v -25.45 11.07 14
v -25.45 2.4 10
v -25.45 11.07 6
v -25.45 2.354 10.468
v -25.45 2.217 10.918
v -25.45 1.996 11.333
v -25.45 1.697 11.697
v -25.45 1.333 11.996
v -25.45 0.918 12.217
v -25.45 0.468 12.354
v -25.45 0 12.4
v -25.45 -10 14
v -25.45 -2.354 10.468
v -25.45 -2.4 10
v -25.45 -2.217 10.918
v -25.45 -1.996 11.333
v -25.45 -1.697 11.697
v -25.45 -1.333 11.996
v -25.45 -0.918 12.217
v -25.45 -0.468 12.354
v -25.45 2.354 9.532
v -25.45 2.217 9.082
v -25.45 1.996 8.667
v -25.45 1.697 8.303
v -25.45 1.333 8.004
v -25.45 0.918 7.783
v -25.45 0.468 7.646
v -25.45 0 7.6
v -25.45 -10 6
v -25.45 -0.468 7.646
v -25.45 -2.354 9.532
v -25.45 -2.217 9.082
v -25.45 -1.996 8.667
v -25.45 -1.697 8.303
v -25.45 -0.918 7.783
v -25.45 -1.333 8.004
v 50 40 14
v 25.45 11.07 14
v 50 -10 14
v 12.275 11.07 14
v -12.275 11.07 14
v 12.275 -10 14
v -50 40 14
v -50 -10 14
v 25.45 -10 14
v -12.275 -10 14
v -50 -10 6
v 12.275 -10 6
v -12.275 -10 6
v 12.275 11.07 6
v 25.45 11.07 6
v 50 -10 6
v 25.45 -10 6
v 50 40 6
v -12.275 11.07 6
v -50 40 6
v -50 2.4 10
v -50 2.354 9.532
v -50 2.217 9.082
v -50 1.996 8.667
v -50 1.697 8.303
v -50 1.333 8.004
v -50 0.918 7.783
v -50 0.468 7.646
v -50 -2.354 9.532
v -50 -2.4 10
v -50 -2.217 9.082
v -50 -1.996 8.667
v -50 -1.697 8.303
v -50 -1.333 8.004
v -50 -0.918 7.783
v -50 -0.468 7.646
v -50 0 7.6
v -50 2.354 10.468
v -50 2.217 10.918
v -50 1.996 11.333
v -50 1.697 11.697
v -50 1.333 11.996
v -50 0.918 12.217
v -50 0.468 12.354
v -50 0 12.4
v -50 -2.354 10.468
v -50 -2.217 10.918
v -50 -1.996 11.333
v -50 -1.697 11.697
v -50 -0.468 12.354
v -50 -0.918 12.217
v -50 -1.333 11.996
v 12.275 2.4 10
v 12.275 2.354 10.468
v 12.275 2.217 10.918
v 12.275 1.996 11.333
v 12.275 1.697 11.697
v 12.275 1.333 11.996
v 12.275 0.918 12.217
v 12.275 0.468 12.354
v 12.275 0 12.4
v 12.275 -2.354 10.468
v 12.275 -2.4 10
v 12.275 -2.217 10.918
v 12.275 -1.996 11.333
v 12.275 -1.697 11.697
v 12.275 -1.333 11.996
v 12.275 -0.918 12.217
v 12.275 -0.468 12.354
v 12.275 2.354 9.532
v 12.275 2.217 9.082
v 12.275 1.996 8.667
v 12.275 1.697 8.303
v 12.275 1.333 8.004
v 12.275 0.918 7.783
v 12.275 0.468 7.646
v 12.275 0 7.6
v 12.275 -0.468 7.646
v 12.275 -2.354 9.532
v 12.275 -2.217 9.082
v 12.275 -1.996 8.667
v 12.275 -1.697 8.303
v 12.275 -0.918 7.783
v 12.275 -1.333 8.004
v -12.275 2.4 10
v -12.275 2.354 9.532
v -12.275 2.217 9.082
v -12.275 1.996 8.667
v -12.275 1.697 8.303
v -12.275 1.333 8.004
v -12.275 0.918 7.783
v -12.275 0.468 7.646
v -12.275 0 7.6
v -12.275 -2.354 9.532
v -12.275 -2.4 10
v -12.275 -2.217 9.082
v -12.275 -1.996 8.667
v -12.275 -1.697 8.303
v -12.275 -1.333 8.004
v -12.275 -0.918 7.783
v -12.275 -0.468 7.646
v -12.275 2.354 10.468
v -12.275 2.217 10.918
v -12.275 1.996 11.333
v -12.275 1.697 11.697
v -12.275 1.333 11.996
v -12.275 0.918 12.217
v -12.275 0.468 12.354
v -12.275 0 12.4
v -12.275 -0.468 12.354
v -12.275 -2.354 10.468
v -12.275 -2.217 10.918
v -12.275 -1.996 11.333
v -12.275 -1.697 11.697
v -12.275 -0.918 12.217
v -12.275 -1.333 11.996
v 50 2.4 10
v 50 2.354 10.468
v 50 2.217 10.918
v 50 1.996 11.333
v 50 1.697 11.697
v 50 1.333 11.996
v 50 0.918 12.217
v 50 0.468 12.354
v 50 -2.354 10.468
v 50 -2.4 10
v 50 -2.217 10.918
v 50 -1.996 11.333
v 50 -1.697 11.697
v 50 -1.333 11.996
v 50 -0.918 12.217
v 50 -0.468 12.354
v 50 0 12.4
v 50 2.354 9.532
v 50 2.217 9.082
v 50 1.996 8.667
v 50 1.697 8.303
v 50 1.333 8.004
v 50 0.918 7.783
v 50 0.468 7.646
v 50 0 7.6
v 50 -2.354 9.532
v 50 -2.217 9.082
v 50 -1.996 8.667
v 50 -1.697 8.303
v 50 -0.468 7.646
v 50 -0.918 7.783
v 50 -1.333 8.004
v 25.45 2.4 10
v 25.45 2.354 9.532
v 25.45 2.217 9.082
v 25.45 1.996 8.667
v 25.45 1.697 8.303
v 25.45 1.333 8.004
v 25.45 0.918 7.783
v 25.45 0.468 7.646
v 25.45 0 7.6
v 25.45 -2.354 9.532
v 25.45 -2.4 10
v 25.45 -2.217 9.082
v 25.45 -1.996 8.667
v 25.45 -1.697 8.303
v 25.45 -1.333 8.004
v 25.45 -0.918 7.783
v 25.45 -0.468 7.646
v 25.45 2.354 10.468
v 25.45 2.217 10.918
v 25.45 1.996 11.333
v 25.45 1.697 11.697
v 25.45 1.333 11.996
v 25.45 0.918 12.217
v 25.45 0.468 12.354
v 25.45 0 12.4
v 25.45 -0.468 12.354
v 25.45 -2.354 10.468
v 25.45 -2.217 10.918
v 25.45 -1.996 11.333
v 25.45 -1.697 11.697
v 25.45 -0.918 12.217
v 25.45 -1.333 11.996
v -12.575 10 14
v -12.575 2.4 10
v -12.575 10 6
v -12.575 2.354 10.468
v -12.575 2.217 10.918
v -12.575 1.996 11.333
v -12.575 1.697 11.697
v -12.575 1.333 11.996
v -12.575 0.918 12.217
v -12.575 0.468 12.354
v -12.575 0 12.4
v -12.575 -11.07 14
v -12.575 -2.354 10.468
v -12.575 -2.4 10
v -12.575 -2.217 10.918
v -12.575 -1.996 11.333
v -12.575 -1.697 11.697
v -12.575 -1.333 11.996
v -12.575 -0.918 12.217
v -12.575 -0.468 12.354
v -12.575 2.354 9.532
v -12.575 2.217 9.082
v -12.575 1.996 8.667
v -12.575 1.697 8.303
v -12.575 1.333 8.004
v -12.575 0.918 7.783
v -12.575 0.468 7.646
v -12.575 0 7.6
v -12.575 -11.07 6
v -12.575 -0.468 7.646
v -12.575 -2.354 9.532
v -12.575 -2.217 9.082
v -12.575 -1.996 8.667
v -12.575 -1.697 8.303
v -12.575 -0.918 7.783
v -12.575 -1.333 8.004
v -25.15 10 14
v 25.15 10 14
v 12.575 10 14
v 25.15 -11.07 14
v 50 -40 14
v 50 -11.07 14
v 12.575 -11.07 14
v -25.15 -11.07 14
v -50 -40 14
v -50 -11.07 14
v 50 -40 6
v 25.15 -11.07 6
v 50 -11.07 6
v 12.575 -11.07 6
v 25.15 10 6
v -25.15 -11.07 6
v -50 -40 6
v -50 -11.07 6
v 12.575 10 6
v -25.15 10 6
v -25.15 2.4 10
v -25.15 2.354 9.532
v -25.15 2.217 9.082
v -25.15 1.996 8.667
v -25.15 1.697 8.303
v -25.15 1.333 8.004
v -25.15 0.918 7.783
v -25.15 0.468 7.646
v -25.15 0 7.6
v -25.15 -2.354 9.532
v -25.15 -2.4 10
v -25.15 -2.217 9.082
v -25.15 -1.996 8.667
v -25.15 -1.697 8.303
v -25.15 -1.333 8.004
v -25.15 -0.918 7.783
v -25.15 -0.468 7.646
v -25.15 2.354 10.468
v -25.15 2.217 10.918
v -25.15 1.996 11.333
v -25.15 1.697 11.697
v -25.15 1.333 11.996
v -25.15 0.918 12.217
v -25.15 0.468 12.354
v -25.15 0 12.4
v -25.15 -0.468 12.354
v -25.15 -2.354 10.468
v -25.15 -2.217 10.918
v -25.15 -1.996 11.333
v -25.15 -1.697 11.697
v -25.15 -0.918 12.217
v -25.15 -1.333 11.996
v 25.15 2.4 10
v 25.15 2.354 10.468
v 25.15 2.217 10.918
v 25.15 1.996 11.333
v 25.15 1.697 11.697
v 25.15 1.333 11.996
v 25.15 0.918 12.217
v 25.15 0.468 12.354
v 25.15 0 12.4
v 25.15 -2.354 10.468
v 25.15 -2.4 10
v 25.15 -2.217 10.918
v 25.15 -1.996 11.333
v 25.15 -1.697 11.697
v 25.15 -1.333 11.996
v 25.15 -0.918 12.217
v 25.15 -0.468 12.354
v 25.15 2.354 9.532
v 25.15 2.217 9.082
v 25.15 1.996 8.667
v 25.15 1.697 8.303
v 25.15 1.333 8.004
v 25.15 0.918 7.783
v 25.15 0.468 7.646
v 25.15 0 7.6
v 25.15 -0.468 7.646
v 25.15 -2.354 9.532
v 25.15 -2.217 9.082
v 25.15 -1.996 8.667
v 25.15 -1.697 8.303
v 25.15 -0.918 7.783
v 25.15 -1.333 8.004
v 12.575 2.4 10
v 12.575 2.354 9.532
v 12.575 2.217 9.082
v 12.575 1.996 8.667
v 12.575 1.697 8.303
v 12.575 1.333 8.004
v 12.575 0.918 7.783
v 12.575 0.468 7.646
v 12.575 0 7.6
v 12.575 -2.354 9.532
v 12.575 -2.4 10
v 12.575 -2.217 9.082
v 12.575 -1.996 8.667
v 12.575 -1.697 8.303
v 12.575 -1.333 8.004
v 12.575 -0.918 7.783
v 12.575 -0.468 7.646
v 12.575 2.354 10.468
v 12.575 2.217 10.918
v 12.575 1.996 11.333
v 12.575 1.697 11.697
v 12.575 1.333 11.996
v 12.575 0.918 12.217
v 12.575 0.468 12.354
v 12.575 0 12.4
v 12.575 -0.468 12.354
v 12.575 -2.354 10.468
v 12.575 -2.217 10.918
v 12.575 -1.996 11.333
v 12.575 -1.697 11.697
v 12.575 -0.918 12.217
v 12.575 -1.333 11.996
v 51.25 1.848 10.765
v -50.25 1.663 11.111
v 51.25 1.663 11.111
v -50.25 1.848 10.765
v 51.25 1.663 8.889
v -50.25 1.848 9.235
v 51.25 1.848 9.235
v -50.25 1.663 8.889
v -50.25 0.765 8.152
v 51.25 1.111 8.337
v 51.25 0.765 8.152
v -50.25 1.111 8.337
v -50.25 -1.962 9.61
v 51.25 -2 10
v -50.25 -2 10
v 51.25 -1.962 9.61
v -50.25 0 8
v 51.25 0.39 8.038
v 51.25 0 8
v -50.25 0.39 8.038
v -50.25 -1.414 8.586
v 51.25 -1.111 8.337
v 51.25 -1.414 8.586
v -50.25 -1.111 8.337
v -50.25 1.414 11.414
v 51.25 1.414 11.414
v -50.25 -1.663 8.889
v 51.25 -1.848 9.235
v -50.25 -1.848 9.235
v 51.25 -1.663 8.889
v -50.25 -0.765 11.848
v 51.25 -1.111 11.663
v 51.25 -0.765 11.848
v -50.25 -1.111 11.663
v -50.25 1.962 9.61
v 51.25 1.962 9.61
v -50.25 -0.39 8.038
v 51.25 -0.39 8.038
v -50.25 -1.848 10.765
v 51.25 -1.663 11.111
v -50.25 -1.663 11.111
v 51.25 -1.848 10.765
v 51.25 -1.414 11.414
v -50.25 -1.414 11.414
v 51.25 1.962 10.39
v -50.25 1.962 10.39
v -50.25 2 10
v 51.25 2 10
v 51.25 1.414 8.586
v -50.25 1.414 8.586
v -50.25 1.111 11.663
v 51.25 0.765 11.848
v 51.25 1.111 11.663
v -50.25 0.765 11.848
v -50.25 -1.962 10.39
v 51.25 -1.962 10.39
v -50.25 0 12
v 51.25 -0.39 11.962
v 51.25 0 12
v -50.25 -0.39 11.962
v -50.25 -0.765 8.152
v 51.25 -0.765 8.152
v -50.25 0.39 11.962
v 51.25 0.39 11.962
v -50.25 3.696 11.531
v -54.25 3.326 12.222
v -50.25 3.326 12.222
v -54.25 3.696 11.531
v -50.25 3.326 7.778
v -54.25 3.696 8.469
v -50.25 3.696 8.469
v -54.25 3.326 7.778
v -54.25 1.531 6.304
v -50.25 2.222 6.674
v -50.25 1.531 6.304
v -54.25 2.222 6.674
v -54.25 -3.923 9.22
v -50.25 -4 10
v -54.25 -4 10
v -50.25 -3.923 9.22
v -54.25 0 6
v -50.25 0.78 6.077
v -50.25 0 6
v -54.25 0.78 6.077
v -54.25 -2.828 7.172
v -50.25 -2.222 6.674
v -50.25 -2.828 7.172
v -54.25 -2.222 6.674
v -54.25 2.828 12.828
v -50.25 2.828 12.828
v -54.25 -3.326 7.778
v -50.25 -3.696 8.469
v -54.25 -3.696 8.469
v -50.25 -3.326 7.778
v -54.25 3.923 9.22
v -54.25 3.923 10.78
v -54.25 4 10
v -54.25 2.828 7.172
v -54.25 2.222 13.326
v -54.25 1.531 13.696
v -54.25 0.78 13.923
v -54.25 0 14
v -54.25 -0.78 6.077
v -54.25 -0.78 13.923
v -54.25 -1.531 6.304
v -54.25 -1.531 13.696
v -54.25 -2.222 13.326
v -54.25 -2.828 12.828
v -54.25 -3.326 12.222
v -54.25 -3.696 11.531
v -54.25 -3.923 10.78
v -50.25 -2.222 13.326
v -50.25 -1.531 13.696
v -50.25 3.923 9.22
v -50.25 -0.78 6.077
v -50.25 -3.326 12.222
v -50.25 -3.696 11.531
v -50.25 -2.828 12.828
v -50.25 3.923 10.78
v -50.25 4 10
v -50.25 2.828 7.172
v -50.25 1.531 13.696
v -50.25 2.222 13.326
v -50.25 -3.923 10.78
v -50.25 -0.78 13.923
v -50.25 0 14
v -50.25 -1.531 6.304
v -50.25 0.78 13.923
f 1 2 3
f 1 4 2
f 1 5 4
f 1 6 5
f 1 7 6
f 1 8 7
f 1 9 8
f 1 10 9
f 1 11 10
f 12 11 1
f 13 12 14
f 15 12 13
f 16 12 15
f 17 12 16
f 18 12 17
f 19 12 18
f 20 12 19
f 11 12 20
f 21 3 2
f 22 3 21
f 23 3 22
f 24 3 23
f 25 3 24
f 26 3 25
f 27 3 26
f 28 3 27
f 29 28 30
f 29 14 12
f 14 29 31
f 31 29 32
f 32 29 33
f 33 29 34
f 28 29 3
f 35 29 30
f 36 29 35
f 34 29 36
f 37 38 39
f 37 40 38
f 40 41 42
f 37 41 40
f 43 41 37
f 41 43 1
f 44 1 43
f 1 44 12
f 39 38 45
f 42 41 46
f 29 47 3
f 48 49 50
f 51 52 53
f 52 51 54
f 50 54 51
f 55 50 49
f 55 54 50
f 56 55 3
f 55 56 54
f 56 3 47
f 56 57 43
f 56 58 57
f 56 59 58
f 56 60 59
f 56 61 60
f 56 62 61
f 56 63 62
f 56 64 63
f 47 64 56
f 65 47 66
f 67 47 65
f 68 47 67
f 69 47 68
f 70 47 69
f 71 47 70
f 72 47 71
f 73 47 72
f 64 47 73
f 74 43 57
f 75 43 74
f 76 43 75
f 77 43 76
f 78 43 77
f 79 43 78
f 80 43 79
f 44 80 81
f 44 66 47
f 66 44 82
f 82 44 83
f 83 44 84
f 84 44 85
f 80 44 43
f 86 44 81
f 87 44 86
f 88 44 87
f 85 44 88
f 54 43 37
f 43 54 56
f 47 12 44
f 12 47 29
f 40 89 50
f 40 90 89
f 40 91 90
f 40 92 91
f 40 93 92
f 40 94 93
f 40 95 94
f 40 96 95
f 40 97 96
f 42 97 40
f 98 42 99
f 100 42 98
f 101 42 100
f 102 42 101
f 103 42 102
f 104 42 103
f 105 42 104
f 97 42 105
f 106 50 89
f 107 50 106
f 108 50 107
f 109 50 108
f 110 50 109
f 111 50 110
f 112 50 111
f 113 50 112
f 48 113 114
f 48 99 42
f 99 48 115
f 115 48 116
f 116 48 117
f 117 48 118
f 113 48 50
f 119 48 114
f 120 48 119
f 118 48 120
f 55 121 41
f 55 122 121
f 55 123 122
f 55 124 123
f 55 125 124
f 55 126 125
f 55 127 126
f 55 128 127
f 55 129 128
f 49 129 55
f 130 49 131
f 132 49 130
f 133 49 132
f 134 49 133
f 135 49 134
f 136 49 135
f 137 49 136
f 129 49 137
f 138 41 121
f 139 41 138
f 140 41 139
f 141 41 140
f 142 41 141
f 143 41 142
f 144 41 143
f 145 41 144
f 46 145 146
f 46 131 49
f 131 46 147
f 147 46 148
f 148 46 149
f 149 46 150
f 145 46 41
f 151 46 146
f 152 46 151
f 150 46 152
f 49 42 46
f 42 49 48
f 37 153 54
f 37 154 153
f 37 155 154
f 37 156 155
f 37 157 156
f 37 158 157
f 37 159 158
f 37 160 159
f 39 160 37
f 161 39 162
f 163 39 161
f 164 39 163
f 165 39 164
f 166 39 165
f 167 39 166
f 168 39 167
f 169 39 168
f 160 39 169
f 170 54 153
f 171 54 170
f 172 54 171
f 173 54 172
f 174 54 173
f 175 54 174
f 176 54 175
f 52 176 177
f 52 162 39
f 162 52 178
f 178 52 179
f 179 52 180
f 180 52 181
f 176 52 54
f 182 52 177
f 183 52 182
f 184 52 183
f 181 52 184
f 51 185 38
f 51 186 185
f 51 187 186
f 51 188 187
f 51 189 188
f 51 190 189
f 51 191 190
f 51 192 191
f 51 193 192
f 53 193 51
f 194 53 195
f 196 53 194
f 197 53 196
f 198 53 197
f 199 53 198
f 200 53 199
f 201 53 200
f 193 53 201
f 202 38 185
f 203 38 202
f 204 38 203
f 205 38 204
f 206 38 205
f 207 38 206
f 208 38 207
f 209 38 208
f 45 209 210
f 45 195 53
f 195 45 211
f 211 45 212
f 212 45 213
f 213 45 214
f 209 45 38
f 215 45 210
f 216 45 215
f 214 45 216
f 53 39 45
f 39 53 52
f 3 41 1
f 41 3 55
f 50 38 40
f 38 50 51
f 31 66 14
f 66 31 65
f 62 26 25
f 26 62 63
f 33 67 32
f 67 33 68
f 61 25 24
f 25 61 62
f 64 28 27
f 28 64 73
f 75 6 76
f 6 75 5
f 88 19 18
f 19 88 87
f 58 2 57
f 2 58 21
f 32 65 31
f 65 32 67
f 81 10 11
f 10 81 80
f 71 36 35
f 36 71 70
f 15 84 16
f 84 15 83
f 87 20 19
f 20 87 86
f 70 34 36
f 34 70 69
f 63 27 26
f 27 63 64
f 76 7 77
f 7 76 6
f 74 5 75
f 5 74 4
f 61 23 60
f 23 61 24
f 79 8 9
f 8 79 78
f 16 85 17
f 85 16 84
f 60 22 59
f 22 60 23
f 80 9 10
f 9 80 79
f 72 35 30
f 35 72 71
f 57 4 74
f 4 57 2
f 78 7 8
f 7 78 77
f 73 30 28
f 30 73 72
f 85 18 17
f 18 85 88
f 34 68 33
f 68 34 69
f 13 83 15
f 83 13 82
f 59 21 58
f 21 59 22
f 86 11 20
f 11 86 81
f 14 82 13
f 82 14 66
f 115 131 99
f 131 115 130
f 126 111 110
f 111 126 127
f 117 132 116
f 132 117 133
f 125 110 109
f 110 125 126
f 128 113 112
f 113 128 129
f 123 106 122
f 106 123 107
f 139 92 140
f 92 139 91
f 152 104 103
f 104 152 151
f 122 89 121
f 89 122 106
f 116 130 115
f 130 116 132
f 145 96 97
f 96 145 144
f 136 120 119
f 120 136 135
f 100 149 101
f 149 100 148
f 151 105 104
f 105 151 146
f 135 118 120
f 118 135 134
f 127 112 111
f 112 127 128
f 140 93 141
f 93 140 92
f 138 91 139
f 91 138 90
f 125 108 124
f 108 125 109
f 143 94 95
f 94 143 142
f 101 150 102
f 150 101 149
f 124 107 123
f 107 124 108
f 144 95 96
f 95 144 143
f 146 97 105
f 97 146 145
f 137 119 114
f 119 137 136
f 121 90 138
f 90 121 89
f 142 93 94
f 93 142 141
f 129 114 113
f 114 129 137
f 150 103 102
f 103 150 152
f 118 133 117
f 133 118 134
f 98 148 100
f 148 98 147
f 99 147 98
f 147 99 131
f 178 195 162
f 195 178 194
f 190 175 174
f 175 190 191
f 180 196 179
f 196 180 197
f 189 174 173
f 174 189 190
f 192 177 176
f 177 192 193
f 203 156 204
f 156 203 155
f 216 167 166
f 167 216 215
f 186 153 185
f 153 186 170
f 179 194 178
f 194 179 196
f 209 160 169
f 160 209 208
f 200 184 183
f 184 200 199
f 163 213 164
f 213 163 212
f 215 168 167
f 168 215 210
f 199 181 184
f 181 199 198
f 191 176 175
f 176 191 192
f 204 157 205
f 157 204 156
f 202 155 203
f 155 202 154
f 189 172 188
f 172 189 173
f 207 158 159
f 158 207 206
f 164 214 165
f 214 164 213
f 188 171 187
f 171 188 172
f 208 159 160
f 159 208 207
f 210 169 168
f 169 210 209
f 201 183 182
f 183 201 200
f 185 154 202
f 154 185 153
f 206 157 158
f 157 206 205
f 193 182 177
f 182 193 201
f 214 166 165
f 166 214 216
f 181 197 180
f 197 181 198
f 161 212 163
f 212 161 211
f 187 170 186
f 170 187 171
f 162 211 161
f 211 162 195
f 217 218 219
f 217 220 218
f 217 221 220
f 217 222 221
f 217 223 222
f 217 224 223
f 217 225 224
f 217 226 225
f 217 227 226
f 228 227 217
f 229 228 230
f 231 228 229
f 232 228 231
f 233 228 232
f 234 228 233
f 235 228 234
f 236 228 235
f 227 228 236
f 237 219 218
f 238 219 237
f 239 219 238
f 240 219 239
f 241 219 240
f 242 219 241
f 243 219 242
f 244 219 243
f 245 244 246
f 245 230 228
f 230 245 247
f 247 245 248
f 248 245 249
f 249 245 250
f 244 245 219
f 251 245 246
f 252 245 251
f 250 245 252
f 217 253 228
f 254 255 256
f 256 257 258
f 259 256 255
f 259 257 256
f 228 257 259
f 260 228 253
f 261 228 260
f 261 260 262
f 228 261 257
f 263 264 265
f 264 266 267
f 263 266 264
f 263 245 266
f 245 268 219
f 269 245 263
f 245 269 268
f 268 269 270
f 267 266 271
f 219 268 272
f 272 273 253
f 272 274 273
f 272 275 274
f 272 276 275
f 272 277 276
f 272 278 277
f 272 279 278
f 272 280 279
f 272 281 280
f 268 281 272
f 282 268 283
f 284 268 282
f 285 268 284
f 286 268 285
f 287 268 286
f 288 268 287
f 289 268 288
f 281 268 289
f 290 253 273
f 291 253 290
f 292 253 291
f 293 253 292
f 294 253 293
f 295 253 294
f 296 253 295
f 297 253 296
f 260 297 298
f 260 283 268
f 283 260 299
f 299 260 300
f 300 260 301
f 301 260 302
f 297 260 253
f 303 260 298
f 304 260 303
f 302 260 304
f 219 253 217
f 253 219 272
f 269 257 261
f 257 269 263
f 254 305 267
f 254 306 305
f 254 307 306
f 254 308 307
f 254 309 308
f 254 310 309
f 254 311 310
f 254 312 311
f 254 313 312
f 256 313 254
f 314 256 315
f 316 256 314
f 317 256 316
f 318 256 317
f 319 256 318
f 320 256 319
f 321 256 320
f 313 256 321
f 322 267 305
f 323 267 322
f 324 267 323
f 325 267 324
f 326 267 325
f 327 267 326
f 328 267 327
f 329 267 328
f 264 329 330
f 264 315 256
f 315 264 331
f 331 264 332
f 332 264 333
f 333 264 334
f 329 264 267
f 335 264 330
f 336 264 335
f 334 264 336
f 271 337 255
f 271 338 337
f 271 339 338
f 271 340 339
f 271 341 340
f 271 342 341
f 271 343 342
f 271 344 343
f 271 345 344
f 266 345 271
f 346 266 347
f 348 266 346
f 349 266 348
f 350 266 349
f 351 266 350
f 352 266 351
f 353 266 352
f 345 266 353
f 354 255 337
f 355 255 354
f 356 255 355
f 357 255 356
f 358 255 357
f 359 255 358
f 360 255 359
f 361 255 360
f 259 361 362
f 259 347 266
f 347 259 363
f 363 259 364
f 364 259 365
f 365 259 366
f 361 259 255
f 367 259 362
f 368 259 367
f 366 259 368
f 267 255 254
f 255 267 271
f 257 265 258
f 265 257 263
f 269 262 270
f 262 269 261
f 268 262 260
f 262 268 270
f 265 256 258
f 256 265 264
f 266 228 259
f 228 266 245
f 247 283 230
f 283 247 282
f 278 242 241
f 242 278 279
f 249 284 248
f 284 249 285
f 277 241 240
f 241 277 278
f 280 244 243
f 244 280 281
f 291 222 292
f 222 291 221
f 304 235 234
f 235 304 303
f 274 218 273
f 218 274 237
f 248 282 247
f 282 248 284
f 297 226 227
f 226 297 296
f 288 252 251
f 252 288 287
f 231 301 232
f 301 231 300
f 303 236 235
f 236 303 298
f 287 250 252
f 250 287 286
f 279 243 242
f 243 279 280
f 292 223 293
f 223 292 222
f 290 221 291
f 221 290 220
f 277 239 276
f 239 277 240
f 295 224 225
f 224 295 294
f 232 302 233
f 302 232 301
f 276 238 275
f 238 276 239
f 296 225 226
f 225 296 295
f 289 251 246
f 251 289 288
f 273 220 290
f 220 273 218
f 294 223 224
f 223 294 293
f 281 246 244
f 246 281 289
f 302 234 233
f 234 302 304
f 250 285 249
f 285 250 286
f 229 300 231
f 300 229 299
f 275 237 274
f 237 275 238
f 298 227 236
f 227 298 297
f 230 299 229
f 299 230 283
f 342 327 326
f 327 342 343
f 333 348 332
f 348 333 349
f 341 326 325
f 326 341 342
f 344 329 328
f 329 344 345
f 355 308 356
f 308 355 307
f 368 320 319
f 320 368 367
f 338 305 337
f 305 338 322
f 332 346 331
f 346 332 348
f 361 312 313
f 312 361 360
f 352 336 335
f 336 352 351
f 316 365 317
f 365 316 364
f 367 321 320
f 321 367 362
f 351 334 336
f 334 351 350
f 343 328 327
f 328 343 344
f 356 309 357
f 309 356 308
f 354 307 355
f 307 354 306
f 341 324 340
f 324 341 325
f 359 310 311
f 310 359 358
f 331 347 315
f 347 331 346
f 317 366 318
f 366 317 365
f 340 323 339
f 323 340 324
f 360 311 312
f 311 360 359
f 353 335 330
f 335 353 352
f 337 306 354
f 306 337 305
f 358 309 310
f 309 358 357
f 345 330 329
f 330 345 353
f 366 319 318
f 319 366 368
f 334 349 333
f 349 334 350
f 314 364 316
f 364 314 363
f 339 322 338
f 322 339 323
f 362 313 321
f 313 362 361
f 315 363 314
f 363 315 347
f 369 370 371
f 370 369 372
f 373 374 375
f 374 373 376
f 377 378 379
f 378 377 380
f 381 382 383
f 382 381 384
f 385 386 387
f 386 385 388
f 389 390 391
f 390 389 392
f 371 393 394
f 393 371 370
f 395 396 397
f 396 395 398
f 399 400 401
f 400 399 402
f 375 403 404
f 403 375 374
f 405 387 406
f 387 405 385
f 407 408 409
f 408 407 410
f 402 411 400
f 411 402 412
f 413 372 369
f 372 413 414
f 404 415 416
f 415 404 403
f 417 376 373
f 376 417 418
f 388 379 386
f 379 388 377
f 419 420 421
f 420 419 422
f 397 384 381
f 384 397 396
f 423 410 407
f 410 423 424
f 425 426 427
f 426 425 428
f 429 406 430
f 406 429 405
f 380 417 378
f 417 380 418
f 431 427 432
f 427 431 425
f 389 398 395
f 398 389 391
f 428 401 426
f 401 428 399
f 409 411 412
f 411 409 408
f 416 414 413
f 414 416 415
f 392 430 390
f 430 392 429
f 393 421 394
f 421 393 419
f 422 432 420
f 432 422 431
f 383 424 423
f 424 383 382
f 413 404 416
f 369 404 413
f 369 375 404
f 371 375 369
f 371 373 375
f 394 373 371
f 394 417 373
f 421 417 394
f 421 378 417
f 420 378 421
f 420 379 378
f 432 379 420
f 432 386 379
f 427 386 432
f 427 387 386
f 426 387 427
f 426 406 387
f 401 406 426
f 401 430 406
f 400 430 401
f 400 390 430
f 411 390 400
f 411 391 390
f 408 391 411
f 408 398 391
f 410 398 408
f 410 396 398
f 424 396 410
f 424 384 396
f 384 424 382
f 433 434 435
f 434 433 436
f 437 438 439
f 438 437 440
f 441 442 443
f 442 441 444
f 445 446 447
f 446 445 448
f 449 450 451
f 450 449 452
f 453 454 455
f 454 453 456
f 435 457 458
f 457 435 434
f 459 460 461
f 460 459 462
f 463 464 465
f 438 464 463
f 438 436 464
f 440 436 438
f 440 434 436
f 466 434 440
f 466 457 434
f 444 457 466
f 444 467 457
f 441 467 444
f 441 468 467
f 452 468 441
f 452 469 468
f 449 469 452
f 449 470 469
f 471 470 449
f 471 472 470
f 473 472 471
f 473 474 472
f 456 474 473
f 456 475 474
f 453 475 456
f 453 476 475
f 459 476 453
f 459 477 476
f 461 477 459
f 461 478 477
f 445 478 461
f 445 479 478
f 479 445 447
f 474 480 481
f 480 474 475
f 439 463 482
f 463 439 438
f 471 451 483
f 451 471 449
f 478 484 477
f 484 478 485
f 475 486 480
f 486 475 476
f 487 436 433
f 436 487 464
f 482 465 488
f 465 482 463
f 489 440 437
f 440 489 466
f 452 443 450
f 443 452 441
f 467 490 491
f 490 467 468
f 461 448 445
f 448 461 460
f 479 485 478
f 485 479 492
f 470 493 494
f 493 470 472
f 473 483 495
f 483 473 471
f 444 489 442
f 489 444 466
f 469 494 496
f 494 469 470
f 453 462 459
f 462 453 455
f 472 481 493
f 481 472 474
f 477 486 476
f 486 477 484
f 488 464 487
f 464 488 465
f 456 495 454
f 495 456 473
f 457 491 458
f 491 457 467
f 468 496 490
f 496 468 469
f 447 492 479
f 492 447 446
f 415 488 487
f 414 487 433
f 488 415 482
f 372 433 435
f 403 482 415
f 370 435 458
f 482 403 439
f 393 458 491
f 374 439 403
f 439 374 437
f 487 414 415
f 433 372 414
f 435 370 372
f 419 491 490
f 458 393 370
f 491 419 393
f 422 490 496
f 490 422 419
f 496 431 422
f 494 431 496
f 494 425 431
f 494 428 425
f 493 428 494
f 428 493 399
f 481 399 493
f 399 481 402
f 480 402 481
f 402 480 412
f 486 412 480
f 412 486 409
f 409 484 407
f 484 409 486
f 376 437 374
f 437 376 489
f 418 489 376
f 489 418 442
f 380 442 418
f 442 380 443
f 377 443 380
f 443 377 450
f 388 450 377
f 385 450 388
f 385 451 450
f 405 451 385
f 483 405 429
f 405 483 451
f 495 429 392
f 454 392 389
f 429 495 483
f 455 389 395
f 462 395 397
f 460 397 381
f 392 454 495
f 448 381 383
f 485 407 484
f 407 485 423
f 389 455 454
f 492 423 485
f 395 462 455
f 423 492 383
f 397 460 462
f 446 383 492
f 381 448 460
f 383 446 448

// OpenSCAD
$fn = 32;

// ------------------------------------------------------------------------
// Butt hinge: hinge 100 mm, leaf swung 0 deg
// Every part is its own module, assembly() places every instance.
// ------------------------------------------------------------------------

// --- part 1 ---
module hinge_base() {
  difference() {
    union() {
      translate([-50, -10, -4]) cube([24.55, 50, 8]);
      translate([-12.275, -10, -4]) cube([24.55, 50, 8]);
      translate([25.45, -10, -4]) cube([24.55, 50, 8]);
      translate([-50, 11.07, -4]) cube([100, 28.93, 8]);
    }
    translate([-37.725, 0, 0]) rotate([0, 90, 0]) cylinder(h = 26.55, d = 4.8, center = true);
    translate([0, 0, 0]) rotate([0, 90, 0]) cylinder(h = 26.55, d = 4.8, center = true);
    translate([37.725, 0, 0]) rotate([0, 90, 0]) cylinder(h = 26.55, d = 4.8, center = true);
  }
}

// --- part 2 ---
module hinge_mover() {
  difference() {
    union() {
      translate([-25.15, -40, -4]) cube([12.575, 50, 8]);
      translate([12.575, -40, -4]) cube([12.575, 50, 8]);
      translate([-50, -40, -4]) cube([100, 28.93, 8]);
    }
    translate([-18.863, 0, 0]) rotate([0, 90, 0]) cylinder(h = 14.575, d = 4.8, center = true);
    translate([18.863, 0, 0]) rotate([0, 90, 0]) cylinder(h = 14.575, d = 4.8, center = true);
  }
}

// --- part 3 ---
module hinge_pin() {
  rotate([0, 90, 0]) cylinder(h = 102.5, d = 4, center = true);
  translate([-54.25, 0, 0]) rotate([0, 90, 0]) cylinder(h = 4, d = 8);
}

// --- assembly ---
module assembly() {
  color([0.80, 0.24, 0.20]) translate([0, 0, 10]) rotate([0, 0, 0]) hinge_base();
  color([0.20, 0.45, 0.75]) translate([0, 0, 10]) rotate([0, 0, 0]) hinge_mover();
  color([0.25, 0.62, 0.32]) translate([0, 0, 10]) rotate([0, 0, 0]) hinge_pin();
}

assembly();
